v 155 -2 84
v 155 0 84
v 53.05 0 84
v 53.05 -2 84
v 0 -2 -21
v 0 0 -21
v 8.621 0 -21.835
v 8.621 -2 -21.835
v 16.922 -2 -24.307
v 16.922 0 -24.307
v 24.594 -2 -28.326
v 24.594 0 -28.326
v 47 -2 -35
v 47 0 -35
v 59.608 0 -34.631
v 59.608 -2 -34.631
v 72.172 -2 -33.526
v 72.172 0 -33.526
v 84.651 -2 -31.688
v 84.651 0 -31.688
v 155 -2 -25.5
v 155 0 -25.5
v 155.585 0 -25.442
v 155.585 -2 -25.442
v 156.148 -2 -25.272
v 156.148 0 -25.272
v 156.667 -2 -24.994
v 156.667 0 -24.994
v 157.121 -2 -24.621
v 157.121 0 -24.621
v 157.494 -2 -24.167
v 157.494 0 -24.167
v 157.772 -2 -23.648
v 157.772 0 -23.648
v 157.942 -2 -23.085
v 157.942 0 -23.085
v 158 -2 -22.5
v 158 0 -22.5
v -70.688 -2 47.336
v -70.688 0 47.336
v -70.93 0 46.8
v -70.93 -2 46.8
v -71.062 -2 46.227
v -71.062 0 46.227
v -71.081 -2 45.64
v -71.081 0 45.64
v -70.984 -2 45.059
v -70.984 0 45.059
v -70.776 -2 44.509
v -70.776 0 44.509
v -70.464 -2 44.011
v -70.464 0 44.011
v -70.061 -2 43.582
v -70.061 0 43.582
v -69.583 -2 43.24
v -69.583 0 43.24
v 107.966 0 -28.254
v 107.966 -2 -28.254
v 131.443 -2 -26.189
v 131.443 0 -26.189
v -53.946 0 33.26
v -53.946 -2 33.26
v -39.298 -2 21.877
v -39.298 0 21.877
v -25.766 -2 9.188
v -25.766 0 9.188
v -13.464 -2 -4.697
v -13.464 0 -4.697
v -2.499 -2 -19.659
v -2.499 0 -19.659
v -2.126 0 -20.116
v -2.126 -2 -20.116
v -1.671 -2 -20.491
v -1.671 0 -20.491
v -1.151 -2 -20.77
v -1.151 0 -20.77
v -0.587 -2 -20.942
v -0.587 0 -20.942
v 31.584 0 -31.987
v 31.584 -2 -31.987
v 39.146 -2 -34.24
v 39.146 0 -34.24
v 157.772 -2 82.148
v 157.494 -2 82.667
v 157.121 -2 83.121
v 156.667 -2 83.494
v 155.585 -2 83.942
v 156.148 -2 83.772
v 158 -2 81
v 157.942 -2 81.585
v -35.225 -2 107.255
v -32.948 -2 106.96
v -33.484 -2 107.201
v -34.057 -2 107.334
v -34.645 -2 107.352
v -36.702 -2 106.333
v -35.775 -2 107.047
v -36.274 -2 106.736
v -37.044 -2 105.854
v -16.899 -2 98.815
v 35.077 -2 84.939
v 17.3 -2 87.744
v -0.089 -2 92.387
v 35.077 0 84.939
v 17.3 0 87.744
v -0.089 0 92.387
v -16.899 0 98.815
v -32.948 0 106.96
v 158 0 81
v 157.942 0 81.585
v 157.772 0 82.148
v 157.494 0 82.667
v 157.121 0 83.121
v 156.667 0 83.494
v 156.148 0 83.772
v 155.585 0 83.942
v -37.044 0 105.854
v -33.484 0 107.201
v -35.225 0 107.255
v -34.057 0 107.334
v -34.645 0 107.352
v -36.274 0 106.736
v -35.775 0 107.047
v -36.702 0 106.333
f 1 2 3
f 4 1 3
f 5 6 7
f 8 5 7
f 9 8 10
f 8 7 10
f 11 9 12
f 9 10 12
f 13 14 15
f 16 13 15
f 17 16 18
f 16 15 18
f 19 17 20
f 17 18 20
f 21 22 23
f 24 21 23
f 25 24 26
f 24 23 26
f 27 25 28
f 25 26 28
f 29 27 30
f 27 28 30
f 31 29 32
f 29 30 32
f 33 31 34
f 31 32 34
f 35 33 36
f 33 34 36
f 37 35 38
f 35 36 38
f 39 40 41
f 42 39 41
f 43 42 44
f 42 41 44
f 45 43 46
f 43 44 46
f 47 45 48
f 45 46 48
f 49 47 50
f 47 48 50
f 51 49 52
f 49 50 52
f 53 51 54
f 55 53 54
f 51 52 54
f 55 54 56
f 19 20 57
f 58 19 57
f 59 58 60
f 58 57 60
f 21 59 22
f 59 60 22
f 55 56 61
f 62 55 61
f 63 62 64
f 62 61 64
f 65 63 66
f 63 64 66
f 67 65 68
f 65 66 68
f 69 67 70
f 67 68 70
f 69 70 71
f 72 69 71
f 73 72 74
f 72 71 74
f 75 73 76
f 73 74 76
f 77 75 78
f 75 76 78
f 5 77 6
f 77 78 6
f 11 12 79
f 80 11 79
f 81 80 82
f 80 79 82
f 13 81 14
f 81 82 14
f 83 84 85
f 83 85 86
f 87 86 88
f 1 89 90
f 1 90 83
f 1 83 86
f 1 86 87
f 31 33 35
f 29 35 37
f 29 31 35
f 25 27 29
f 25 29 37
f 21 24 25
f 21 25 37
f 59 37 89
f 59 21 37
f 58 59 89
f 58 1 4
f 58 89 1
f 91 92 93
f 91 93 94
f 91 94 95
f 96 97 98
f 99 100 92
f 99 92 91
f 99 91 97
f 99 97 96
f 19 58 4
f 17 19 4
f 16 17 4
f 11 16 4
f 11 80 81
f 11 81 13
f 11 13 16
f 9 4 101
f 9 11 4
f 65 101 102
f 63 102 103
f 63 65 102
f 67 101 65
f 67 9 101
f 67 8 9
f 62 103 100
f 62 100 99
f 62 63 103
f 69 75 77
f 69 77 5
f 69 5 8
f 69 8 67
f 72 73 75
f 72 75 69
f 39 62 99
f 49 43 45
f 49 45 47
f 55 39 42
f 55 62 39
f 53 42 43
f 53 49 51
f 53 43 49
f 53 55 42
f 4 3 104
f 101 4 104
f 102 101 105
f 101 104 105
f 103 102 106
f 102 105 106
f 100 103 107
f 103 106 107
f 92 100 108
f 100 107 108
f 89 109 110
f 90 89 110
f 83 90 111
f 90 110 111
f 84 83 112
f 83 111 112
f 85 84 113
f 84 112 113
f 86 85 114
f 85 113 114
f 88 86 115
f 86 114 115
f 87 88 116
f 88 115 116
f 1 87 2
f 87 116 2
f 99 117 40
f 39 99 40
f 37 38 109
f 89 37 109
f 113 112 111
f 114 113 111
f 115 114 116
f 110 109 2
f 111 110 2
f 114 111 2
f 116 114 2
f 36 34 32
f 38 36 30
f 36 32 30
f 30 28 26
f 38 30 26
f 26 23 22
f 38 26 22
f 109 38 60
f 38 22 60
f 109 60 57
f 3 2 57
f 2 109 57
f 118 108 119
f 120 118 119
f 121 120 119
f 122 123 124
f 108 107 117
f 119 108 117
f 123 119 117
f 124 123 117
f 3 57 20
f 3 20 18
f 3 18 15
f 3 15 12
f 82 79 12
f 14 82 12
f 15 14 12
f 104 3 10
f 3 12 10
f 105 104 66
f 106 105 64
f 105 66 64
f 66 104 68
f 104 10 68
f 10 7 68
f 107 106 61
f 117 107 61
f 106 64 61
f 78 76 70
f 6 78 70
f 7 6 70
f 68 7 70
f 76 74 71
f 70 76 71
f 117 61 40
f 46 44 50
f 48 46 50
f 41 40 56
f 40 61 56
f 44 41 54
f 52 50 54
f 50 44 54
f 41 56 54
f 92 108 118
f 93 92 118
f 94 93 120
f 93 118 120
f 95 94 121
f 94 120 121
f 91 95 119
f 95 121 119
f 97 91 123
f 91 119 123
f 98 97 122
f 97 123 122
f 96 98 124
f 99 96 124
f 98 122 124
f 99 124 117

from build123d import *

# Parameters (mm, degrees)
BOSS_EXTRUDE1_DEPTH = 2


with BuildPart() as part:
    # Sketch3 → Boss-Extrude1 (new body)
    with BuildSketch(Plane(origin=(0, 0, 0), x_dir=(1, 0, 0), z_dir=(0, 1, 0))):
        with BuildLine():
            Line((158, 22.5), (158, -81))
            ThreePointArc((158, -81), (157.121320344, -83.121320344), (155, -84))
            Line((155, -84), (53.050466482, -84))
            ThreePointArc((53.050466482, -84), (8.545143105, -89.838724048), (-32.948056713, -106.959730921))
            ThreePointArc((-32.948056713, -106.959730921), (-35.225053269, -107.255305993), (-37.044136112, -105.854229426))
            Line((-37.044136112, -105.854229426), (-70.68813753, -47.336444363))
            ThreePointArc((-70.68813753, -47.336444363), (-70.983712602, -45.059447807), (-69.582636034, -43.240364964))
            ThreePointArc((-69.582636034, -43.240364964), (-32.385273168, -15.689281312), (-2.499253861, 19.659436693))
            ThreePointArc((-2.499253861, 19.659436693), (-1.418042651, 20.643701012), (0, 21))
            ThreePointArc((0, 21), (12.831153008, 22.8704149), (24.594386694, 28.325987526))
            ThreePointArc((24.594386694, 28.325987526), (35.310753338, 33.296042365), (47, 35))
            ThreePointArc((47, 35), (65.898115208, 34.170434491), (84.650849693, 31.688119703))
            ThreePointArc((84.650849693, 31.688119703), (119.689605729, 27.050010933), (155, 25.5))
            ThreePointArc((155, 25.5), (157.121320344, 24.621320344), (158, 22.5))
        make_face()
    extrude(amount=-BOSS_EXTRUDE1_DEPTH)


solid = part.part
